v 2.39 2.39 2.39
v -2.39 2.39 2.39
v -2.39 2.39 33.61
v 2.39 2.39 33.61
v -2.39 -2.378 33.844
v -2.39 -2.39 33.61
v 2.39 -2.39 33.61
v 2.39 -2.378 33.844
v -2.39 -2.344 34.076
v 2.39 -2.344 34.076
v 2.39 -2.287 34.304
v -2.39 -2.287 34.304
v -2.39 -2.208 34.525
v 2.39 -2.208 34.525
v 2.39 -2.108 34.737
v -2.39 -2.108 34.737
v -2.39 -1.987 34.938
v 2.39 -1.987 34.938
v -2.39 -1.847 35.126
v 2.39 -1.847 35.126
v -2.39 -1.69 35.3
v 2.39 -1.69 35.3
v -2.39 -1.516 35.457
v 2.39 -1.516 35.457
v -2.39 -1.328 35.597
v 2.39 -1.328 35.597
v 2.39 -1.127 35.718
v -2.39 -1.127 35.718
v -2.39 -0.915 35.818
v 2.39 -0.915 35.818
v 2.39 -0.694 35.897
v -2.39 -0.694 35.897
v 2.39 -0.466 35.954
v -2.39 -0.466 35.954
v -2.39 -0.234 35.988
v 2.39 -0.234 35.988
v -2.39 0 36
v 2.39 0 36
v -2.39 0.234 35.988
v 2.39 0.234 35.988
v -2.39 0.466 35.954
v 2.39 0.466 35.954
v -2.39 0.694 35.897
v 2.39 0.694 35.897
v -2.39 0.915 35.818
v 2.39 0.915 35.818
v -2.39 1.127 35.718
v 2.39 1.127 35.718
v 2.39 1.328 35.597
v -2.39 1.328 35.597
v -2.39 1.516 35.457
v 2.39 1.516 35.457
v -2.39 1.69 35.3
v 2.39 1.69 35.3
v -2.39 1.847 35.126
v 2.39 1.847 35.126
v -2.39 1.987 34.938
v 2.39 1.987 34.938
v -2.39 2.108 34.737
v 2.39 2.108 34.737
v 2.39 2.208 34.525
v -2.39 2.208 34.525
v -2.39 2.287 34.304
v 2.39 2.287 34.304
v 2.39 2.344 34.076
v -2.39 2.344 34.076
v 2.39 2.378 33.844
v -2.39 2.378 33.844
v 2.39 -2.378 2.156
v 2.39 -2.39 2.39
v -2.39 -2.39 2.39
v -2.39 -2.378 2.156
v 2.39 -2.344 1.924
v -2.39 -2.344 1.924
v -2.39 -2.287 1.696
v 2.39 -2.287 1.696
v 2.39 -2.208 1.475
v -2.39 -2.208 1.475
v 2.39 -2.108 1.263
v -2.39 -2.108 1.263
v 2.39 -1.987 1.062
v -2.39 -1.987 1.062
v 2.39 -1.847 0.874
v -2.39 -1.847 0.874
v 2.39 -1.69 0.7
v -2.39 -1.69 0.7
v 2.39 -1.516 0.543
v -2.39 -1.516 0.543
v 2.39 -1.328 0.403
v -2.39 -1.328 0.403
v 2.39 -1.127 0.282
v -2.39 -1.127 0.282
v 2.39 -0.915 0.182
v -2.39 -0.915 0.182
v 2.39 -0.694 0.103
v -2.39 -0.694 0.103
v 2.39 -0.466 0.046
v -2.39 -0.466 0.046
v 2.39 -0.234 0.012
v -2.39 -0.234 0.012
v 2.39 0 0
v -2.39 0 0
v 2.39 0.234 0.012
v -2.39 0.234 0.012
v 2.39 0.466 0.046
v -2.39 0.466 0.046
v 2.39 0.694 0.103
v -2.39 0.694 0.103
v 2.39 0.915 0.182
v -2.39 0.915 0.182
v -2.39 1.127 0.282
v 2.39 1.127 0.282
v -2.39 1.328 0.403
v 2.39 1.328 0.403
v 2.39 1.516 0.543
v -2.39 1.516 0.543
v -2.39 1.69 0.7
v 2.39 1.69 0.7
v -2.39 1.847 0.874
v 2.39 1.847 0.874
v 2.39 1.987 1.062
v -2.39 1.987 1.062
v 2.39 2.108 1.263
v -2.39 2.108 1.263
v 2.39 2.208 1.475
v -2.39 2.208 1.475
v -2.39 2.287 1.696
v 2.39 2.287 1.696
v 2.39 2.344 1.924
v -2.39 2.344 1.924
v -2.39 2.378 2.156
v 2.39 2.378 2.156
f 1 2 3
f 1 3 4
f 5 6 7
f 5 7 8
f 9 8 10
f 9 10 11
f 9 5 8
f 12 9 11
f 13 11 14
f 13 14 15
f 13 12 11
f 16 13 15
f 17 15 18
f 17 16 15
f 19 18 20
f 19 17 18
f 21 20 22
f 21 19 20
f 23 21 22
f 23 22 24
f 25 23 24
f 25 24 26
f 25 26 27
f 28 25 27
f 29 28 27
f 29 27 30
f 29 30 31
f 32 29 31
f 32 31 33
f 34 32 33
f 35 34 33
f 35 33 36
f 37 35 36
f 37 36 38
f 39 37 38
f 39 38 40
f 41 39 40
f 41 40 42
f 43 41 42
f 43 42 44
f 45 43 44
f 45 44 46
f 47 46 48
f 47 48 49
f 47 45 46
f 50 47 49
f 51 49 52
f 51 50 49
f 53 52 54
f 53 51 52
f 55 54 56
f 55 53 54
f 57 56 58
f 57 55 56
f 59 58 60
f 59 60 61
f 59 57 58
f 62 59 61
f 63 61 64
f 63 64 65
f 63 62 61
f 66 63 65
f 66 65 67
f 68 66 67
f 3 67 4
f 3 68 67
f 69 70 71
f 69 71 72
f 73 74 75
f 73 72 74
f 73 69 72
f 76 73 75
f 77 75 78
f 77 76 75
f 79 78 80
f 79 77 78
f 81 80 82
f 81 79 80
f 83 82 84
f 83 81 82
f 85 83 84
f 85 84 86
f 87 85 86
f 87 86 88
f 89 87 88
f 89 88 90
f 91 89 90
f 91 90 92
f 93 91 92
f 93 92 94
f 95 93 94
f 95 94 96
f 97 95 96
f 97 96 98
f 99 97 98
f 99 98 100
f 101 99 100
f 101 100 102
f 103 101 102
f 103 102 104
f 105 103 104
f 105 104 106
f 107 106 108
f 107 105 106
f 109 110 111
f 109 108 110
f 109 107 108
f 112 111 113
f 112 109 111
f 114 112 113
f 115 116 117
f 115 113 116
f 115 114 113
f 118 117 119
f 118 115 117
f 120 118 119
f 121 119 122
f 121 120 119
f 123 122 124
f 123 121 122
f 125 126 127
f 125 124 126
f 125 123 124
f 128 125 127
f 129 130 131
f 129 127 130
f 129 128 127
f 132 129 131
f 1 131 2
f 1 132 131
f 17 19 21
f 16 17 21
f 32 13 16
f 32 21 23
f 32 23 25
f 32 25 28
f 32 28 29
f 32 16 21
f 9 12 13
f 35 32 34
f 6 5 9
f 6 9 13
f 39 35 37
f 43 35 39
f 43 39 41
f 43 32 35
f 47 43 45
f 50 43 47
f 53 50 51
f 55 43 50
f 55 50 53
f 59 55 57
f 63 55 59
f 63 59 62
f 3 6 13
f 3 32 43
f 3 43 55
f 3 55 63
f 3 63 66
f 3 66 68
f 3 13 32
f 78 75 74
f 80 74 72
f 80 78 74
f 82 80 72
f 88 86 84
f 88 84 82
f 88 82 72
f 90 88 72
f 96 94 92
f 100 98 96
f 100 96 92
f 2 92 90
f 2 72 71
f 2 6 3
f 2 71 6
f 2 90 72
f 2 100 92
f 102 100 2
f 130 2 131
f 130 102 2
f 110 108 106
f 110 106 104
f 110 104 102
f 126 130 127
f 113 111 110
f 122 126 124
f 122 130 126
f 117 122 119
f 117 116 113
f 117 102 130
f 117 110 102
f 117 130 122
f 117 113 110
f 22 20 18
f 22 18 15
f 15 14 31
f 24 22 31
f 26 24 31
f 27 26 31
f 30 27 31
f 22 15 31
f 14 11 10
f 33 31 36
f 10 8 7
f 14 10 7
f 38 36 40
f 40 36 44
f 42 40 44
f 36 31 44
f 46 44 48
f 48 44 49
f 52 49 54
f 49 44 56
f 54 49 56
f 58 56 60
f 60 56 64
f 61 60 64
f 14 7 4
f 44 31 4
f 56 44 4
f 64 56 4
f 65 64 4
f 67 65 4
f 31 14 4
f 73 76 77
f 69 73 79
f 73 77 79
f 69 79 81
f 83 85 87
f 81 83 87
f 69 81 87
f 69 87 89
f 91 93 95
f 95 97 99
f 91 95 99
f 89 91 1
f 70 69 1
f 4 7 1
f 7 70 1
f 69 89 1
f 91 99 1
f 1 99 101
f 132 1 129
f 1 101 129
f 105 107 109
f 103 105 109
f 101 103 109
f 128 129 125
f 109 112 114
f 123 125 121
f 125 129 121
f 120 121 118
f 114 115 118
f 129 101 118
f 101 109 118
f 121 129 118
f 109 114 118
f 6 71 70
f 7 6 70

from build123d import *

# Parameters (mm, degrees)
SZKIC1_W                    = 4.78
SZKIC1_H                    = 4.78
DODANIE_WYCI_GNI_CIE1_DEPTH = 36
ZAOKR_GLENIE1_RADIUS        = 2.39
ZAOKR_GLENIE1_LENGTH        = 4.78
ZAOKR_GLENIE2_RADIUS        = 2.39
ZAOKR_GLENIE2_LENGTH        = 4.78


with BuildPart() as part:
    # Szkic1 → Dodanie-wyciągnięcie1 (new body)
    with BuildSketch(Plane.XY):
        Rectangle(SZKIC1_W, SZKIC1_H)
    extrude(amount=DODANIE_WYCI_GNI_CIE1_DEPTH)

    # Zaokrąglenie1: full round fillet: the end face becomes a half cylinder, R = half its width
    zaokr_glenie1_face = Plane((0, 0, 36), x_dir=(-1, 0, 0), z_dir=(0, 0, 1))  # on the end face: x along it, z out of the body
    zaokr_glenie1_slab = zaokr_glenie1_face.offset(-ZAOKR_GLENIE1_RADIUS / 2) * Box(ZAOKR_GLENIE1_LENGTH, 2 * ZAOKR_GLENIE1_RADIUS, ZAOKR_GLENIE1_RADIUS, mode=Mode.PRIVATE)  # the body's end, R deep
    zaokr_glenie1_round = Plane((0, 0, 33.61), x_dir=(0, 0, 1), z_dir=(-1, 0, 0)) * Cylinder(ZAOKR_GLENIE1_RADIUS, ZAOKR_GLENIE1_LENGTH, mode=Mode.PRIVATE)  # its axis R under the face
    add(zaokr_glenie1_slab - zaokr_glenie1_round, mode=Mode.SUBTRACT)

    # Zaokrąglenie2: full round fillet: the end face becomes a half cylinder, R = half its width
    zaokr_glenie2_face = Plane((0, 0, 0), x_dir=(1, 0, 0), z_dir=(0, 0, -1))  # on the end face: x along it, z out of the body
    zaokr_glenie2_slab = zaokr_glenie2_face.offset(-ZAOKR_GLENIE2_RADIUS / 2) * Box(ZAOKR_GLENIE2_LENGTH, 2 * ZAOKR_GLENIE2_RADIUS, ZAOKR_GLENIE2_RADIUS, mode=Mode.PRIVATE)  # the body's end, R deep
    zaokr_glenie2_round = Plane((0, 0, 2.39), x_dir=(0, 0, -1), z_dir=(1, 0, 0)) * Cylinder(ZAOKR_GLENIE2_RADIUS, ZAOKR_GLENIE2_LENGTH, mode=Mode.PRIVATE)  # its axis R under the face
    add(zaokr_glenie2_slab - zaokr_glenie2_round, mode=Mode.SUBTRACT)


solid = part.part
